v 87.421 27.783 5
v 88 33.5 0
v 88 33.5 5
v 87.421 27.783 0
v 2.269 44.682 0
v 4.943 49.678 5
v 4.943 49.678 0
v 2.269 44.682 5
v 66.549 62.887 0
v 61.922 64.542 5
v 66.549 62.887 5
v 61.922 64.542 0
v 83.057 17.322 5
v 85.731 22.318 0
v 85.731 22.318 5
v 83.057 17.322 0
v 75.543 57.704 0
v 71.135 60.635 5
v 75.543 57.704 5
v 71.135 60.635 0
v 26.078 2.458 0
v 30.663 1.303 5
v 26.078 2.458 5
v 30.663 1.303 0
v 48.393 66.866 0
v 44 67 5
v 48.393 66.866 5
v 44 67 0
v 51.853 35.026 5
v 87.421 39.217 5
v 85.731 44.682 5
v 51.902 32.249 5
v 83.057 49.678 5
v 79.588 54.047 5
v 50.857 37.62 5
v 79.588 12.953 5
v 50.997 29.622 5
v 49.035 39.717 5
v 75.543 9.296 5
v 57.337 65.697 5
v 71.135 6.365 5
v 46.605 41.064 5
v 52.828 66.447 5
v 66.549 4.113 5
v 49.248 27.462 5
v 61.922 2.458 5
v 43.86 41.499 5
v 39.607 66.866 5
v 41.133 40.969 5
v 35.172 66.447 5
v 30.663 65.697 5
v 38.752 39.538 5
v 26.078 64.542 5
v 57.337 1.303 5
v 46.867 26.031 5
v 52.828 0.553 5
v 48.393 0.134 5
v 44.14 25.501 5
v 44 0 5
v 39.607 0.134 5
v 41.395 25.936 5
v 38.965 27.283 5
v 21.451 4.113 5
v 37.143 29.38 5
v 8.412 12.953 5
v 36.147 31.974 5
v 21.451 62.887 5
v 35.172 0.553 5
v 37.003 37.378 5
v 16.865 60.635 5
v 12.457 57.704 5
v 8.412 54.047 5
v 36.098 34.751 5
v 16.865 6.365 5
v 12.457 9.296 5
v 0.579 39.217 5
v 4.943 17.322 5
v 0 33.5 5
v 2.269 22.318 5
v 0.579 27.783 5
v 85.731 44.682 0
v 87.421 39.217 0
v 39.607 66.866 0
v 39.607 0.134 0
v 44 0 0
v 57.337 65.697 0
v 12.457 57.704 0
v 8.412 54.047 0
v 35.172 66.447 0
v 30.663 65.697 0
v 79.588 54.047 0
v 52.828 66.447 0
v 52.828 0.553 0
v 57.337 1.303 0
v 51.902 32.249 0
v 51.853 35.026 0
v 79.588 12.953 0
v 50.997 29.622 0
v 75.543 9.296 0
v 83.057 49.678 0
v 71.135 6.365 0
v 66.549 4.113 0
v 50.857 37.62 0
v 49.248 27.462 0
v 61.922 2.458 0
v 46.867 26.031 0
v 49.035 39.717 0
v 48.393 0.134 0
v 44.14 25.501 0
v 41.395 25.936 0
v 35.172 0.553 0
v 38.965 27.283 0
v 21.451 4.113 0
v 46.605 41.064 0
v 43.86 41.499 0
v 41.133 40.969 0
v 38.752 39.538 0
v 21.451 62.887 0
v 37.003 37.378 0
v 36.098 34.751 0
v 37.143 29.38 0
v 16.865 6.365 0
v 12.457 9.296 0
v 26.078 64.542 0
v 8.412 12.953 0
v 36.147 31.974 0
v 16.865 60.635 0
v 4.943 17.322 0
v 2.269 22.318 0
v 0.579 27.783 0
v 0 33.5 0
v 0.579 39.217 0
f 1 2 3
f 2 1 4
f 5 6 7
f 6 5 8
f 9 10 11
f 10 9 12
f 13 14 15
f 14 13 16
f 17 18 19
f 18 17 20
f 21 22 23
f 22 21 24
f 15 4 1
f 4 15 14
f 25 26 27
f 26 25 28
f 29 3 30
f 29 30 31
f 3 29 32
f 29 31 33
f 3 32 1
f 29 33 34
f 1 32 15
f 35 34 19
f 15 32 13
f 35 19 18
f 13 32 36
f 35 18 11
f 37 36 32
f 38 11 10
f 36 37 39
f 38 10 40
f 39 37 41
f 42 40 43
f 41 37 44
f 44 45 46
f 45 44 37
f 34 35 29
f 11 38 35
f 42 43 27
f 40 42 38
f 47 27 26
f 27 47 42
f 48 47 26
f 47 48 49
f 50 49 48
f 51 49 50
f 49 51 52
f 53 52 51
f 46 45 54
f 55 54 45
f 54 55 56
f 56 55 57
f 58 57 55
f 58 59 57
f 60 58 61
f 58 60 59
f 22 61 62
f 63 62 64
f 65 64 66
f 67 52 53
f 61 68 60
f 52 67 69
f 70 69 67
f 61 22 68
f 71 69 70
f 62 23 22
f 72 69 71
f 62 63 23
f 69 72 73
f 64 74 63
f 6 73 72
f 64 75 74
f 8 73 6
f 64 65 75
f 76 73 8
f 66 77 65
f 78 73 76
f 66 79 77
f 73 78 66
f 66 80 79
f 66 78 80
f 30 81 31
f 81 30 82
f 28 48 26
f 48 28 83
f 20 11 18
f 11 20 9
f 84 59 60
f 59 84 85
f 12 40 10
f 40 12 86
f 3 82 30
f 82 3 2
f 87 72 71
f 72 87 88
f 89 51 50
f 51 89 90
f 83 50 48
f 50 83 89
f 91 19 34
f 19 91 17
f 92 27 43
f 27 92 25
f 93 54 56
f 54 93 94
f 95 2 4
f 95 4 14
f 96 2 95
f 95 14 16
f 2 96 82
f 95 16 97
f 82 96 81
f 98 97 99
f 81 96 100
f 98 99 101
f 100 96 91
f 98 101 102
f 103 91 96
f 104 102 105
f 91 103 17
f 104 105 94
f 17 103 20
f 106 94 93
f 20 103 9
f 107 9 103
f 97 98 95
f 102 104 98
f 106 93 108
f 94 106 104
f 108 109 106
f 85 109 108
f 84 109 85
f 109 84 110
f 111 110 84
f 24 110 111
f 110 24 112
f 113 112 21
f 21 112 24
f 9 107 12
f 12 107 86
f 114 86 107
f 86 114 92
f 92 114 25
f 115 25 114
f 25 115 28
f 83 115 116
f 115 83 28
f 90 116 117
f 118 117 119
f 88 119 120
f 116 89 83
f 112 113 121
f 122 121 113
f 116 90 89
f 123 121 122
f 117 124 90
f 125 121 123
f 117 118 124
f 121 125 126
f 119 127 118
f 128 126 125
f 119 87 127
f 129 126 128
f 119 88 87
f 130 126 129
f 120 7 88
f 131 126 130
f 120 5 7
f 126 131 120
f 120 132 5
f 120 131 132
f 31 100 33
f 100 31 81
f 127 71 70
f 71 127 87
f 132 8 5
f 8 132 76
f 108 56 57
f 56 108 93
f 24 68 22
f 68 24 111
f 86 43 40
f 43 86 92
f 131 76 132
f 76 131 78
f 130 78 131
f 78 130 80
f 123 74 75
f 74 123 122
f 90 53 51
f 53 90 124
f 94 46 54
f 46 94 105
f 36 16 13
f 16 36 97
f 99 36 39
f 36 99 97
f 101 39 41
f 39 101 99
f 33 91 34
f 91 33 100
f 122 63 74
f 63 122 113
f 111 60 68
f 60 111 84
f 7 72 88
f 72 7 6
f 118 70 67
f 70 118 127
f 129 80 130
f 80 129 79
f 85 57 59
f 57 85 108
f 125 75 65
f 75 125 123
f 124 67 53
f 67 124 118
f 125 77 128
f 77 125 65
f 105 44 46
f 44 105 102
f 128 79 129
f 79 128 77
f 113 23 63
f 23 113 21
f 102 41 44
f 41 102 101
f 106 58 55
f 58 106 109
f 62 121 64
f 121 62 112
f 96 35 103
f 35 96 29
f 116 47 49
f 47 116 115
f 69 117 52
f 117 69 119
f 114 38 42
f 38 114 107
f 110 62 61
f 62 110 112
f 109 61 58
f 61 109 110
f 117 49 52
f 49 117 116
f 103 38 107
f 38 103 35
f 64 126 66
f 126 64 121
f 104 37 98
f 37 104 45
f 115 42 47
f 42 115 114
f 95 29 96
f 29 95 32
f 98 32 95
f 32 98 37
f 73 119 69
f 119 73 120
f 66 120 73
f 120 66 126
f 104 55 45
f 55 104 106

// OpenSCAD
$fn = 32;

// ----------------------------------------------------------------------
// Cam plate: double_lobe cam, base R32
// ----------------------------------------------------------------------

// --- parameters (mm) ---
base_r = 32;              // base circle radius
lobe_h = 12;              // cam lobe rise
bore_r = 8;               // shaft bore radius
plate_t = 5;              // plate thickness, Z (extrusion height)

profile = [[88, 33.5], [87.421, 39.217], [85.731, 44.682], [83.057, 49.678], [79.588, 54.047], [75.543, 57.704], [71.135, 60.635], [66.549, 62.887], [61.922, 64.542], [57.337, 65.697], [52.828, 66.447], [48.393, 66.866], [44, 67], [39.607, 66.866], [35.172, 66.447], [30.663, 65.697], [26.078, 64.542], [21.451, 62.887], [16.865, 60.635], [12.457, 57.704], [8.412, 54.047], [4.943, 49.678], [2.269, 44.682], [0.579, 39.217], [0, 33.5], [0.579, 27.783], [2.269, 22.318], [4.943, 17.322], [8.412, 12.953], [12.457, 9.296], [16.865, 6.365], [21.451, 4.113], [26.078, 2.458], [30.663, 1.303], [35.172, 0.553], [39.607, 0.134], [44, 0], [48.393, 0.134], [52.828, 0.553], [57.337, 1.303], [61.922, 2.458], [66.549, 4.113], [71.135, 6.365], [75.543, 9.296], [79.588, 12.953], [83.057, 17.322], [85.731, 22.318], [87.421, 27.783]];  // primary outline, 48 points, counter clockwise
void_1 = [[51.853, 35.026], [50.857, 37.62], [49.035, 39.717], [46.605, 41.064], [43.86, 41.499], [41.133, 40.969], [38.752, 39.538], [37.003, 37.378], [36.098, 34.751], [36.147, 31.974], [37.143, 29.38], [38.965, 27.283], [41.395, 25.936], [44.14, 25.501], [46.867, 26.031], [49.248, 27.462], [50.997, 29.622], [51.902, 32.249]];  // shaft bore, 18 points

// --- the one profile operation ---
difference() {
  linear_extrude(height = plate_t) polygon(points = profile);
  translate([0, 0, -1])
    linear_extrude(height = plate_t + 2) polygon(points = void_1);
}
